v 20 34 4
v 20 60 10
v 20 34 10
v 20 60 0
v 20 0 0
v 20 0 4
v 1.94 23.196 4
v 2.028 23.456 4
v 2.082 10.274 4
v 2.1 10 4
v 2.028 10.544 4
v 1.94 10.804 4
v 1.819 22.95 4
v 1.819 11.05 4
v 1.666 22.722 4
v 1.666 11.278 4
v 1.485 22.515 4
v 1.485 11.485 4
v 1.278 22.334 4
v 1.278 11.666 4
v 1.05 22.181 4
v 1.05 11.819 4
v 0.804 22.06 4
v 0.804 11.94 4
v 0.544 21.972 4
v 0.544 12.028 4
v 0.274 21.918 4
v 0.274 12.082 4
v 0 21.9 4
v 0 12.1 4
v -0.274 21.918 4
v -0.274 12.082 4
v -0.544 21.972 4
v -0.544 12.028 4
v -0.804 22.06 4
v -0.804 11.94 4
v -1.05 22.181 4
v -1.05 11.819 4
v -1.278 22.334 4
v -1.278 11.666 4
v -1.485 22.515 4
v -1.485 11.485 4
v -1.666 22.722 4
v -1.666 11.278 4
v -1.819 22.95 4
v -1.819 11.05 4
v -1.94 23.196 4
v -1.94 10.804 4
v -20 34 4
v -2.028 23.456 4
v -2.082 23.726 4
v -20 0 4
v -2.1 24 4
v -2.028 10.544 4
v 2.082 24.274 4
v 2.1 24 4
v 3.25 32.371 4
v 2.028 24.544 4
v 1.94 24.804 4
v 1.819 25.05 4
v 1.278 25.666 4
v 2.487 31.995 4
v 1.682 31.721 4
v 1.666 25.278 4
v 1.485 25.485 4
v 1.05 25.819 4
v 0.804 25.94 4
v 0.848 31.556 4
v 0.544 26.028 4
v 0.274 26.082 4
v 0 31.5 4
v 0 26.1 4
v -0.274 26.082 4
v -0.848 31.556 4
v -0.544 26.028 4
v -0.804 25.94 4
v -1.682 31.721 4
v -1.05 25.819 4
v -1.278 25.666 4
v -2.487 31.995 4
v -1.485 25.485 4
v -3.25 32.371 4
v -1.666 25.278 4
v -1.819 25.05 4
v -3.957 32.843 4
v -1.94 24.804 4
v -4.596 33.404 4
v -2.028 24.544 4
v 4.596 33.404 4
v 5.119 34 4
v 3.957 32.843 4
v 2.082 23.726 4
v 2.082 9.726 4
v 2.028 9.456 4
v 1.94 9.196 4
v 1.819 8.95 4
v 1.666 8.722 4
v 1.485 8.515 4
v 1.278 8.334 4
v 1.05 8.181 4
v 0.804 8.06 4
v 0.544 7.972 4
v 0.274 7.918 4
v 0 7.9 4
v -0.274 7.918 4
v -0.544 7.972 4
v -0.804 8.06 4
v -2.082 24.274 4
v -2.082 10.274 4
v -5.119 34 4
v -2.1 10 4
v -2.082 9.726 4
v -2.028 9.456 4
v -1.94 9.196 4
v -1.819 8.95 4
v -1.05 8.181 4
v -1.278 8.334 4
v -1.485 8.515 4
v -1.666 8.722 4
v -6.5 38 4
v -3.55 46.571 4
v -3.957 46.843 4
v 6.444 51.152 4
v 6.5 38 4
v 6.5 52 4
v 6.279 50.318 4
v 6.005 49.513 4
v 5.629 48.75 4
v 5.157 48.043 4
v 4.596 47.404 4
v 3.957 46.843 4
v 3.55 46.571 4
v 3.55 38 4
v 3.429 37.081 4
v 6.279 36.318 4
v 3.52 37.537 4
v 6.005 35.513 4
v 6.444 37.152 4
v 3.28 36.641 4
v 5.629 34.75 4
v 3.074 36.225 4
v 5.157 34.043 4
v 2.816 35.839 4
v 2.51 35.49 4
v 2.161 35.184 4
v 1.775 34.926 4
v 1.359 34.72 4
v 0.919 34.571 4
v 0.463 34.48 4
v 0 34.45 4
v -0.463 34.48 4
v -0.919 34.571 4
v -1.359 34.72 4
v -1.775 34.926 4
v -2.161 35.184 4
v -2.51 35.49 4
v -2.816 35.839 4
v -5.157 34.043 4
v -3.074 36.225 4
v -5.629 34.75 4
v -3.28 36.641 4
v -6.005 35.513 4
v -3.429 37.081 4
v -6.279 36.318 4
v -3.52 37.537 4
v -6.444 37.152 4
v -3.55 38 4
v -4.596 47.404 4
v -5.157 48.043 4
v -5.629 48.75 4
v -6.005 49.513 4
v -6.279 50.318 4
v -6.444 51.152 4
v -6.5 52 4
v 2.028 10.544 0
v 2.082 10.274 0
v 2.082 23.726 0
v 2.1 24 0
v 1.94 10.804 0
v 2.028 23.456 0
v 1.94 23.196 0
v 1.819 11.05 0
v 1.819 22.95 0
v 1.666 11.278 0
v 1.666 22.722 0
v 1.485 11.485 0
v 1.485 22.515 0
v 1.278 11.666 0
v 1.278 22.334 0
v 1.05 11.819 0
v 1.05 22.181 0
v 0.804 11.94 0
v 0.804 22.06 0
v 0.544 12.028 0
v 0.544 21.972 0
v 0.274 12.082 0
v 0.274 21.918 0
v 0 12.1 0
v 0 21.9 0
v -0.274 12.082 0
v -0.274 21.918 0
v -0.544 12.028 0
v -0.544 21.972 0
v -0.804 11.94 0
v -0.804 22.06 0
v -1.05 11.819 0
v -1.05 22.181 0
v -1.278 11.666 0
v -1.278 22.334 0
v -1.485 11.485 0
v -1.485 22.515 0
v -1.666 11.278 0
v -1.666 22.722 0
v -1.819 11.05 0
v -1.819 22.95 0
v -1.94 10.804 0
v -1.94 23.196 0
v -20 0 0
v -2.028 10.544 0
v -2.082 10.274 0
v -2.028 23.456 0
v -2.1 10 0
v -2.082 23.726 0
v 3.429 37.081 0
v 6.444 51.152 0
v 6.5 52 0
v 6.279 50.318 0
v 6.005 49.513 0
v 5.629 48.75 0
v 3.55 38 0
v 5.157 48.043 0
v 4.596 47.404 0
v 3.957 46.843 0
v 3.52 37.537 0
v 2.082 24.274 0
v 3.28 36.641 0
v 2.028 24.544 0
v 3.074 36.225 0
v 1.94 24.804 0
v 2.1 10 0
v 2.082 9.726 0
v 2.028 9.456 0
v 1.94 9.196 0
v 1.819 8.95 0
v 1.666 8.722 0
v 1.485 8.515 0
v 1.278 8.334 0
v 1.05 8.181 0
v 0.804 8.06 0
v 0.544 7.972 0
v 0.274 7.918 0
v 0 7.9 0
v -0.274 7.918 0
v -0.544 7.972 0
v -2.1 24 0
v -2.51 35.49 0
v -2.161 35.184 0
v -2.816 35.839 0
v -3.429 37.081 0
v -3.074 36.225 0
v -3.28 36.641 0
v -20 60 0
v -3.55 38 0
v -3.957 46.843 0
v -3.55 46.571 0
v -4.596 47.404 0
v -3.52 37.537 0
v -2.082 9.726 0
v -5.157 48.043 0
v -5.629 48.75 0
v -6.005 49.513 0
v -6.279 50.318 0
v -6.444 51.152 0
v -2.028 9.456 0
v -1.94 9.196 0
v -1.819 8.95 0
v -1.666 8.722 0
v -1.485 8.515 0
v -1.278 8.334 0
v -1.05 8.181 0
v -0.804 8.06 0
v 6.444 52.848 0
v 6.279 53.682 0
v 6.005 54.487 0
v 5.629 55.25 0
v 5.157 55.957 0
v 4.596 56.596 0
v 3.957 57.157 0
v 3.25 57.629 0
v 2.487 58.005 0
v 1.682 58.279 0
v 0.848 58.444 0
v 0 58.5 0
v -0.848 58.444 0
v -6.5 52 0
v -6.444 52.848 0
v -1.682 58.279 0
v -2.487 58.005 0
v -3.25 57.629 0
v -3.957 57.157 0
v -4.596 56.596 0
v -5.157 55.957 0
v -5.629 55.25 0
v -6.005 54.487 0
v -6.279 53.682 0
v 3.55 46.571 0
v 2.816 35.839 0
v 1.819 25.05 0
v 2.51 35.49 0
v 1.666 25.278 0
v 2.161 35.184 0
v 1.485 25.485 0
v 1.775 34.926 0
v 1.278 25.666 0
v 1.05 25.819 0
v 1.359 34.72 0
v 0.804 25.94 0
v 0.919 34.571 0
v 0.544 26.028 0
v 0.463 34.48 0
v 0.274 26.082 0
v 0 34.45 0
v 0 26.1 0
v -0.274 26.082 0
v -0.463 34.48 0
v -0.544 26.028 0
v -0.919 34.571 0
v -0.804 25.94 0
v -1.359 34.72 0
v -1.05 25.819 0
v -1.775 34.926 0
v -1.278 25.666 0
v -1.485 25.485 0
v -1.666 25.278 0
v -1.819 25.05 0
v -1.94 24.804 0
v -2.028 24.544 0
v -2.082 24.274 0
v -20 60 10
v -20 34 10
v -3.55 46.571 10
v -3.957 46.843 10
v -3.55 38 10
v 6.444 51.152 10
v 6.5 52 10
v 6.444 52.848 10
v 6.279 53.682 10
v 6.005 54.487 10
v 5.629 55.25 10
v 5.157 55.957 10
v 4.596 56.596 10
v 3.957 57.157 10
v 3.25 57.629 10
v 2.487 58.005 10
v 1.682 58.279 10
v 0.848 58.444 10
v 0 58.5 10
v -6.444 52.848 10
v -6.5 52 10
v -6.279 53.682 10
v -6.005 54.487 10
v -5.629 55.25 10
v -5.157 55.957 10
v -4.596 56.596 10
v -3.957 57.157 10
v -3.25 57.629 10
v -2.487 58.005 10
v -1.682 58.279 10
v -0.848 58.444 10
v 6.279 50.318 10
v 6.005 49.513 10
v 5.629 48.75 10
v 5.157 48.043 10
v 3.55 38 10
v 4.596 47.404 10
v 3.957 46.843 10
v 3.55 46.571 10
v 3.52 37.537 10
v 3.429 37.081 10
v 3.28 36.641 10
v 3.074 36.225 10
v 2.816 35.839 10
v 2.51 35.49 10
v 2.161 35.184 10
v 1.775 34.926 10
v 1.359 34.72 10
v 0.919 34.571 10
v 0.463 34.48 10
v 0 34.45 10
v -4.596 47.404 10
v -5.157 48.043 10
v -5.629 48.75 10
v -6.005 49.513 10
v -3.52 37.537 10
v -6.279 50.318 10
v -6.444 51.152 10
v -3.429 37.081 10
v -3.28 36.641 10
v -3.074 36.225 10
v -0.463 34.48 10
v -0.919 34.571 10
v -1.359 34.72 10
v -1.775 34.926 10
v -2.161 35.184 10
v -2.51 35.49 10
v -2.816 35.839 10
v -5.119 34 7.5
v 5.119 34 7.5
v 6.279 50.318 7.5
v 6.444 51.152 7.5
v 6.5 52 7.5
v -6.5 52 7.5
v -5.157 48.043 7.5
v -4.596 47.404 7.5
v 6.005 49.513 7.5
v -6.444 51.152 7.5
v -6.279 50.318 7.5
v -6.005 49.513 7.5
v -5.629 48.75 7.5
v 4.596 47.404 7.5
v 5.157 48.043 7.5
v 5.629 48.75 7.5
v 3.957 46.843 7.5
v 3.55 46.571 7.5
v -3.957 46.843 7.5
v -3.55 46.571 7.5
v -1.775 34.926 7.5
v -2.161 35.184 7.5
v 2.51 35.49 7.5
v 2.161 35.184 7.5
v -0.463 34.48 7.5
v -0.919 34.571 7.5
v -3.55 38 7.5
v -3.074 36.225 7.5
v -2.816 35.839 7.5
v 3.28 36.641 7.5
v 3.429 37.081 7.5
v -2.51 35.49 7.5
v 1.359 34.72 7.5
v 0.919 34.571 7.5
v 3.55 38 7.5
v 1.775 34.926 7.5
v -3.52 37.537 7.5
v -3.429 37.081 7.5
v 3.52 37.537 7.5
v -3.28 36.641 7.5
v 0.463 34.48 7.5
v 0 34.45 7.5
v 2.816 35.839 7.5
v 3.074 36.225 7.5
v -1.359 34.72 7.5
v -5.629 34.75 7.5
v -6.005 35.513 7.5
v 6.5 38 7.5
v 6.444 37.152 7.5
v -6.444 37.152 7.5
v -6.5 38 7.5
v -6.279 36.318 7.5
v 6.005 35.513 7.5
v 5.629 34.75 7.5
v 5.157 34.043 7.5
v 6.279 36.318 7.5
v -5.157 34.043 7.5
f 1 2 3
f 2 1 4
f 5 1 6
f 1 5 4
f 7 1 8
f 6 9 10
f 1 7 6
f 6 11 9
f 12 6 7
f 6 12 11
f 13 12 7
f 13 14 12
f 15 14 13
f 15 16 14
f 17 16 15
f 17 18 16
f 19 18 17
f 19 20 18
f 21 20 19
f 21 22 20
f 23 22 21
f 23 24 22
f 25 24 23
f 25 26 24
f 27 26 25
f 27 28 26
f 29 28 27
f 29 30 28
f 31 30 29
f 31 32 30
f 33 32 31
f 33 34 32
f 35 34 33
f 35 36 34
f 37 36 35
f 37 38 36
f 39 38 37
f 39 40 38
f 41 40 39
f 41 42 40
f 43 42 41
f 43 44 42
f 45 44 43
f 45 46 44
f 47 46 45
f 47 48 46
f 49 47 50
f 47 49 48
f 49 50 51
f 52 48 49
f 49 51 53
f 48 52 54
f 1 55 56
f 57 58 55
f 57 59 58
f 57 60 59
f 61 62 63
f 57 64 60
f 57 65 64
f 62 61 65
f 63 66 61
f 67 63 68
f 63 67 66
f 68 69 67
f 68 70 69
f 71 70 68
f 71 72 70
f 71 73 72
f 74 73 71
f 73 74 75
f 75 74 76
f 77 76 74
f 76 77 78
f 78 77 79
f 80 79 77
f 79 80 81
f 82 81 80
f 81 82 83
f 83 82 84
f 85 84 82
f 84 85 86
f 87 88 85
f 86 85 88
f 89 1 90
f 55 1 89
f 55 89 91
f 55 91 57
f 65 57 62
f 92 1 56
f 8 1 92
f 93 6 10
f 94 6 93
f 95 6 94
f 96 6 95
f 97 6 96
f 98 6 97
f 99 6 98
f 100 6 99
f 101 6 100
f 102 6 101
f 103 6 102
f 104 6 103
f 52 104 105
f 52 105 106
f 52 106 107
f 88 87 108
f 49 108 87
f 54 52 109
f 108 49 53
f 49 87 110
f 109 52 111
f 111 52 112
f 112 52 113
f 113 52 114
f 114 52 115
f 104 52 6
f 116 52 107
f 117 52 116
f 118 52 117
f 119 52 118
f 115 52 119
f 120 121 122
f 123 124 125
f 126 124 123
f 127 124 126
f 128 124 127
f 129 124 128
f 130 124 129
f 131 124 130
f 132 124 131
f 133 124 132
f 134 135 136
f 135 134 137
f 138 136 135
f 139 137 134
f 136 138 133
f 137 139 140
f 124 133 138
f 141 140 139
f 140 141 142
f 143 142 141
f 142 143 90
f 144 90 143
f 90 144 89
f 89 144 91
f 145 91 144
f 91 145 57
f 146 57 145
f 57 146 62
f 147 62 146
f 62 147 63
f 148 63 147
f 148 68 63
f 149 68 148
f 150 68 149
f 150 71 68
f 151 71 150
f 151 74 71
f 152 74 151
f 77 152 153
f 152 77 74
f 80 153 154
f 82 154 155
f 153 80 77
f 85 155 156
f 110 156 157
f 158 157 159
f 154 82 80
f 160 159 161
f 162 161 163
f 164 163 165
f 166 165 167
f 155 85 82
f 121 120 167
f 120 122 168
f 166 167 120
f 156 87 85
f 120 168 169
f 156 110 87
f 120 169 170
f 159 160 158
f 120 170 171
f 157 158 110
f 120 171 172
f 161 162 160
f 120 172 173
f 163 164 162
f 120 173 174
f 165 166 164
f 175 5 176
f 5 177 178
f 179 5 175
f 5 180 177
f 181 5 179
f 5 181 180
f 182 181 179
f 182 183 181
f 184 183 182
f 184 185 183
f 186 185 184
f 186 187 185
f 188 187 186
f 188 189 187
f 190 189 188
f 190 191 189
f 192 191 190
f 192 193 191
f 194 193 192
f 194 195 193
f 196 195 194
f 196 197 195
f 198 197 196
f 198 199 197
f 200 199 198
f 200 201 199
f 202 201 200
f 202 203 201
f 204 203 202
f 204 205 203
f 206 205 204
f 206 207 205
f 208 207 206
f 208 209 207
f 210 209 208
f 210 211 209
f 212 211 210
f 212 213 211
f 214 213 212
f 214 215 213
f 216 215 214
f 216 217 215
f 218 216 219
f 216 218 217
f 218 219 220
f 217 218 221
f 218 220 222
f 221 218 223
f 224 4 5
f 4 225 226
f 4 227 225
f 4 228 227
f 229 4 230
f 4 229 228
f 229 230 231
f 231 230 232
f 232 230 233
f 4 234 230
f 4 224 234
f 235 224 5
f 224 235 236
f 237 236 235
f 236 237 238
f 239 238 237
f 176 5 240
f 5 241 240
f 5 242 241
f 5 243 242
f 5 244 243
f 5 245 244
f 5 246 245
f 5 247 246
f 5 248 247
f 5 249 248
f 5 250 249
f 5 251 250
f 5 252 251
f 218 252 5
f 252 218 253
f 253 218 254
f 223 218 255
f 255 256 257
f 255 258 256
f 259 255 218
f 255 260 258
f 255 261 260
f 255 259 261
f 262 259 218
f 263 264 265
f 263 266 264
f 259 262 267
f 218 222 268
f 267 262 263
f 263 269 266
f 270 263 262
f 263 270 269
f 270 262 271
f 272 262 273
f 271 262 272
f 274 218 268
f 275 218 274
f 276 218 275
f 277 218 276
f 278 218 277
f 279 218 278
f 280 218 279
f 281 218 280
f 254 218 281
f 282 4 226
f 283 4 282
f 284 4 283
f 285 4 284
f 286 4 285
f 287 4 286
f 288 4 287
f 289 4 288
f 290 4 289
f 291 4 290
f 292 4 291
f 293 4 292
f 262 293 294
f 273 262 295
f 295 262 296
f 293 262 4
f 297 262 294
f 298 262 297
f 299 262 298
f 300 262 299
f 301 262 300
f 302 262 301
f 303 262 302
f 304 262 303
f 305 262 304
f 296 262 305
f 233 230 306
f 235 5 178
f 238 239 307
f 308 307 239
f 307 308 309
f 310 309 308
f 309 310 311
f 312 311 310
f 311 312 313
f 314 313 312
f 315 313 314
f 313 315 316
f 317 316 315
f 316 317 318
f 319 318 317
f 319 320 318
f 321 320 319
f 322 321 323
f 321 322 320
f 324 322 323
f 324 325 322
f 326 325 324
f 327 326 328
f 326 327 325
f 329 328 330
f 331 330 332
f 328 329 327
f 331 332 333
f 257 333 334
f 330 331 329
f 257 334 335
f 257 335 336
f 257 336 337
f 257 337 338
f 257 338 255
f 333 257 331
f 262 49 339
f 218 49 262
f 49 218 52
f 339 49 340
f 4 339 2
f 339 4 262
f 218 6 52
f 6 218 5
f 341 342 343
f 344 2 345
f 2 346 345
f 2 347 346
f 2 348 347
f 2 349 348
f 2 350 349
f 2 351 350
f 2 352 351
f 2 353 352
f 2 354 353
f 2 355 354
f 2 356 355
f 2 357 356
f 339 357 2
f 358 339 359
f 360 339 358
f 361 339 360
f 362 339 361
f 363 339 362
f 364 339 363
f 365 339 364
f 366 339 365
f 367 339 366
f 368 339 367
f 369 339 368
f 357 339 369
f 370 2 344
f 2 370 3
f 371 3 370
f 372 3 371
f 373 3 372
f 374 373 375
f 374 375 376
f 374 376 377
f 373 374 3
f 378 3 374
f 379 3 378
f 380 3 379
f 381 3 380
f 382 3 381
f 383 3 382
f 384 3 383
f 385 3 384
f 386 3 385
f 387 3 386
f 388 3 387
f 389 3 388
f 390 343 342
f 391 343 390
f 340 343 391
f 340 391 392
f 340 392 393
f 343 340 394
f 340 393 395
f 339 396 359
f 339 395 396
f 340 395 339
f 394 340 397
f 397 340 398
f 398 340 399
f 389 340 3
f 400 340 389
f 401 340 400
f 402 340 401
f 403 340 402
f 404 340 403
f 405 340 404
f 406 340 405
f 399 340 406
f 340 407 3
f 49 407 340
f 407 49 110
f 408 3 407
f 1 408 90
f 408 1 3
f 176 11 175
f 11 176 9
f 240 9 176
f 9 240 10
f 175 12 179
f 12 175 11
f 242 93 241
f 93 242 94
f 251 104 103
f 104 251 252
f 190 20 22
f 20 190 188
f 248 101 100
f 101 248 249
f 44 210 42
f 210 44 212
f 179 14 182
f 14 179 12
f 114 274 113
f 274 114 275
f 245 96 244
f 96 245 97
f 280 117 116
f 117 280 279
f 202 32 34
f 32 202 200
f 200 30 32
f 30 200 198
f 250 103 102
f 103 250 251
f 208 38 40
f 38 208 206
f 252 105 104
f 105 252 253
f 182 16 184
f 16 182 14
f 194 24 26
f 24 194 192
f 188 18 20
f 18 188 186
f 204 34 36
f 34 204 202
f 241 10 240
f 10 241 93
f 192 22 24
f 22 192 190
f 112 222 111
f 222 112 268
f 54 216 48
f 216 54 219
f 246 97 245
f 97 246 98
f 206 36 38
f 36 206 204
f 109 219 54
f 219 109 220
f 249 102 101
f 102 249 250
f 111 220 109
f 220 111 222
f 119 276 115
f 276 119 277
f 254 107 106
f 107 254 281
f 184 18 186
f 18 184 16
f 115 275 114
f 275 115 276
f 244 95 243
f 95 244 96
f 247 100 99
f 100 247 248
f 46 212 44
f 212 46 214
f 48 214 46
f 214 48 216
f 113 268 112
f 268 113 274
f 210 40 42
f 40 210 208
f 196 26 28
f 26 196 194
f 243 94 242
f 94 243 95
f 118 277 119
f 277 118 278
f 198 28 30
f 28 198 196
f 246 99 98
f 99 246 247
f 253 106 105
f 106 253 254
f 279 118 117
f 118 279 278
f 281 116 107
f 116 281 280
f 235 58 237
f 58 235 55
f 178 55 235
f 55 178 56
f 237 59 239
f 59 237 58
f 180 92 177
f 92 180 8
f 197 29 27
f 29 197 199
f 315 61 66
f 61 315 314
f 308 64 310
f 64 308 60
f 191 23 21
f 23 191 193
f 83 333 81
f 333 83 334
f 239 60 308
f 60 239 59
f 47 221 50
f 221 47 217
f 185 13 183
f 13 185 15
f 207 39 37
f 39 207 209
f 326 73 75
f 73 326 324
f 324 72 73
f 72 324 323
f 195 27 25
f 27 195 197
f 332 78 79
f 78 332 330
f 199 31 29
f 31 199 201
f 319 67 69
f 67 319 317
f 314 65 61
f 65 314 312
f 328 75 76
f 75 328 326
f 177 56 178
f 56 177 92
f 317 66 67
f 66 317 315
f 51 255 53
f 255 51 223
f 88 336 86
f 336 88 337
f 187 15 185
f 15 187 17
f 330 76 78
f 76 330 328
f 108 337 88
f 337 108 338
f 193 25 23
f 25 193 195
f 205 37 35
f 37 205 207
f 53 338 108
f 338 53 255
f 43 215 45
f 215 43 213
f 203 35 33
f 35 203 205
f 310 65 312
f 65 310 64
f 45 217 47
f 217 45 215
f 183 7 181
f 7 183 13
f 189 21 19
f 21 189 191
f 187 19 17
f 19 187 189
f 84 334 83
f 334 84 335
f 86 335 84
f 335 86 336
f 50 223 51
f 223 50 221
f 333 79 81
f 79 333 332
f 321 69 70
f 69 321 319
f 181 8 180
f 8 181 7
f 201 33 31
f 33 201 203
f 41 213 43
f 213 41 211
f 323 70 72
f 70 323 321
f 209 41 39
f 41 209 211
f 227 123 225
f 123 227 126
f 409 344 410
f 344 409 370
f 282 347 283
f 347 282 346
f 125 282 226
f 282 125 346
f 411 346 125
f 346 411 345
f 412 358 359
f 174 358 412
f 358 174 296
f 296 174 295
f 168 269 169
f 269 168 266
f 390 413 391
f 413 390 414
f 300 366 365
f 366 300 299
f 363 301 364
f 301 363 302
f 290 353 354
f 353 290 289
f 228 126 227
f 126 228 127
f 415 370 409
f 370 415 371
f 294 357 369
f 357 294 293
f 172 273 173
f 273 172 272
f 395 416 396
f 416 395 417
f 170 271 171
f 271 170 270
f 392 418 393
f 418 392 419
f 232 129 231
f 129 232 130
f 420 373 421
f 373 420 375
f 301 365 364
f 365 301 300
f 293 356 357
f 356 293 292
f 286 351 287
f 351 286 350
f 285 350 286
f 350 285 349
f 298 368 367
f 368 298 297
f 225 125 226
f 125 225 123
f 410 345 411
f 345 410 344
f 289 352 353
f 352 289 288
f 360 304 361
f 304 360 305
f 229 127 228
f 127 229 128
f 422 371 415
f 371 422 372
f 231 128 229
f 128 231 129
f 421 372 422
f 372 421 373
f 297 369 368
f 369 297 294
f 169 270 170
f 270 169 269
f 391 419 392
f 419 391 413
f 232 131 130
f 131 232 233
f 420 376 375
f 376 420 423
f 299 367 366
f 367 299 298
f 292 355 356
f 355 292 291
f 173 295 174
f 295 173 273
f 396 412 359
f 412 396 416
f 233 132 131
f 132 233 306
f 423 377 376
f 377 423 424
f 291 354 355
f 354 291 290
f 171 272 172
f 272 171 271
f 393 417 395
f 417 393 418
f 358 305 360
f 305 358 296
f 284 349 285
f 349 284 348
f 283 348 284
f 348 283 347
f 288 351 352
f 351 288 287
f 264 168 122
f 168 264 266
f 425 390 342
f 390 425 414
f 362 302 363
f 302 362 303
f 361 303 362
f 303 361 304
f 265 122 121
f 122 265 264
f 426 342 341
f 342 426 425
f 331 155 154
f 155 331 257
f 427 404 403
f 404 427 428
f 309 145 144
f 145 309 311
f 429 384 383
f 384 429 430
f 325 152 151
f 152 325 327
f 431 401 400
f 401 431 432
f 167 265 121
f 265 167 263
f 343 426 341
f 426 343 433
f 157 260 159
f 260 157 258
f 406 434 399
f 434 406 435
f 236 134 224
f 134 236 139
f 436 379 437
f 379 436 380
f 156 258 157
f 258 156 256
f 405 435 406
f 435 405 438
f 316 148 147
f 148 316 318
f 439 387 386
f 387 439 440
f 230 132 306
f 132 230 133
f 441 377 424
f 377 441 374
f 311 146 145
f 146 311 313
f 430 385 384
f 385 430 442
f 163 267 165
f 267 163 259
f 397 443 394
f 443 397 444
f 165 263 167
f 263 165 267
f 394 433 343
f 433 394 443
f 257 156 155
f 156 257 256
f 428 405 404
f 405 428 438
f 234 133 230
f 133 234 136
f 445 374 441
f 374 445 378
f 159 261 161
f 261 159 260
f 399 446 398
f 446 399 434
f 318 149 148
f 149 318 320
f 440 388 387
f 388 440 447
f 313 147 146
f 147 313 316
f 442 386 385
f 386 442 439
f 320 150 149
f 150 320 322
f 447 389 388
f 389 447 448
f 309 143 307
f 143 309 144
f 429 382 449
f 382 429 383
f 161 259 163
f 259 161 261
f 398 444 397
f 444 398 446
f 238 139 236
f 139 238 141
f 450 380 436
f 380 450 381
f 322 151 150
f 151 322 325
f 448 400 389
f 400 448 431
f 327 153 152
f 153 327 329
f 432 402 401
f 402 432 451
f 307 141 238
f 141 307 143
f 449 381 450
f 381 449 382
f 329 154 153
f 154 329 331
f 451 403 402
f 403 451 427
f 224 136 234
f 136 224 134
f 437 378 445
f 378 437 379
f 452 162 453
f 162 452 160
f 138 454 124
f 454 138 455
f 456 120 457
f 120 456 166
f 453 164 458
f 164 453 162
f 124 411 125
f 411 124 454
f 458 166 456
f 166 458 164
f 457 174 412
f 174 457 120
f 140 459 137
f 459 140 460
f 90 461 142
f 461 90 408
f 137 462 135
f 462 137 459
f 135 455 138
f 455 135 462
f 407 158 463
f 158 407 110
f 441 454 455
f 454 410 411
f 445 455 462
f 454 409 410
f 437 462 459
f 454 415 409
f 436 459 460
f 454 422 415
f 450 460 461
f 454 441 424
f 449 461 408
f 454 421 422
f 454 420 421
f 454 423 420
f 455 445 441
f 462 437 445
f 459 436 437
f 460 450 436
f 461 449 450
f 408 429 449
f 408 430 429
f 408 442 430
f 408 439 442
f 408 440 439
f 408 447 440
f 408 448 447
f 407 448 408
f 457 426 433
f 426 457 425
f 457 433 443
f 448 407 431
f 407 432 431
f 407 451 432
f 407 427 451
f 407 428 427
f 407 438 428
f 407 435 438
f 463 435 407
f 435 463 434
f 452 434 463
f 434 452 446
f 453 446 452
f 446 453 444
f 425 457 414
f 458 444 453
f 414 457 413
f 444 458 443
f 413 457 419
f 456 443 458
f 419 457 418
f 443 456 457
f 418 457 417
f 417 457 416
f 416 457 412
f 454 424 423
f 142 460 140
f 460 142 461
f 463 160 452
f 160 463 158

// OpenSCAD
// Keyhole microphone hanger for mobile/base rigs (fits mics with a rear hanger button). CC0.
// button = head diameter of the mic's hanger button, neck = its neck diameter, check your mic.
button = 12; neck = 6.5; plate = [40, 60, 4]; screw = 4.2;
$fn = 48;
difference() {
  union() {
    translate([-plate[0] / 2, 0, 0]) cube(plate);
    translate([-plate[0] / 2, plate[1] - 26, 0]) cube([plate[0], 26, plate[2] + 6]);
  }
  // keyhole: drop the button in the big hole, slide down into the slot
  translate([0, plate[1] - 8, -1]) cylinder(d = button + 1, h = 20);
  hull() for (y = [plate[1] - 8, plate[1] - 22]) translate([0, y, -1]) cylinder(d = neck + 0.6, h = 20);
  hull() for (y = [plate[1] - 8, plate[1] - 22]) translate([0, y, plate[2]]) cylinder(d = button + 1, h = 3.5);
  for (y = [10, 24]) translate([0, y, -1]) cylinder(d = screw, h = 10);
}
